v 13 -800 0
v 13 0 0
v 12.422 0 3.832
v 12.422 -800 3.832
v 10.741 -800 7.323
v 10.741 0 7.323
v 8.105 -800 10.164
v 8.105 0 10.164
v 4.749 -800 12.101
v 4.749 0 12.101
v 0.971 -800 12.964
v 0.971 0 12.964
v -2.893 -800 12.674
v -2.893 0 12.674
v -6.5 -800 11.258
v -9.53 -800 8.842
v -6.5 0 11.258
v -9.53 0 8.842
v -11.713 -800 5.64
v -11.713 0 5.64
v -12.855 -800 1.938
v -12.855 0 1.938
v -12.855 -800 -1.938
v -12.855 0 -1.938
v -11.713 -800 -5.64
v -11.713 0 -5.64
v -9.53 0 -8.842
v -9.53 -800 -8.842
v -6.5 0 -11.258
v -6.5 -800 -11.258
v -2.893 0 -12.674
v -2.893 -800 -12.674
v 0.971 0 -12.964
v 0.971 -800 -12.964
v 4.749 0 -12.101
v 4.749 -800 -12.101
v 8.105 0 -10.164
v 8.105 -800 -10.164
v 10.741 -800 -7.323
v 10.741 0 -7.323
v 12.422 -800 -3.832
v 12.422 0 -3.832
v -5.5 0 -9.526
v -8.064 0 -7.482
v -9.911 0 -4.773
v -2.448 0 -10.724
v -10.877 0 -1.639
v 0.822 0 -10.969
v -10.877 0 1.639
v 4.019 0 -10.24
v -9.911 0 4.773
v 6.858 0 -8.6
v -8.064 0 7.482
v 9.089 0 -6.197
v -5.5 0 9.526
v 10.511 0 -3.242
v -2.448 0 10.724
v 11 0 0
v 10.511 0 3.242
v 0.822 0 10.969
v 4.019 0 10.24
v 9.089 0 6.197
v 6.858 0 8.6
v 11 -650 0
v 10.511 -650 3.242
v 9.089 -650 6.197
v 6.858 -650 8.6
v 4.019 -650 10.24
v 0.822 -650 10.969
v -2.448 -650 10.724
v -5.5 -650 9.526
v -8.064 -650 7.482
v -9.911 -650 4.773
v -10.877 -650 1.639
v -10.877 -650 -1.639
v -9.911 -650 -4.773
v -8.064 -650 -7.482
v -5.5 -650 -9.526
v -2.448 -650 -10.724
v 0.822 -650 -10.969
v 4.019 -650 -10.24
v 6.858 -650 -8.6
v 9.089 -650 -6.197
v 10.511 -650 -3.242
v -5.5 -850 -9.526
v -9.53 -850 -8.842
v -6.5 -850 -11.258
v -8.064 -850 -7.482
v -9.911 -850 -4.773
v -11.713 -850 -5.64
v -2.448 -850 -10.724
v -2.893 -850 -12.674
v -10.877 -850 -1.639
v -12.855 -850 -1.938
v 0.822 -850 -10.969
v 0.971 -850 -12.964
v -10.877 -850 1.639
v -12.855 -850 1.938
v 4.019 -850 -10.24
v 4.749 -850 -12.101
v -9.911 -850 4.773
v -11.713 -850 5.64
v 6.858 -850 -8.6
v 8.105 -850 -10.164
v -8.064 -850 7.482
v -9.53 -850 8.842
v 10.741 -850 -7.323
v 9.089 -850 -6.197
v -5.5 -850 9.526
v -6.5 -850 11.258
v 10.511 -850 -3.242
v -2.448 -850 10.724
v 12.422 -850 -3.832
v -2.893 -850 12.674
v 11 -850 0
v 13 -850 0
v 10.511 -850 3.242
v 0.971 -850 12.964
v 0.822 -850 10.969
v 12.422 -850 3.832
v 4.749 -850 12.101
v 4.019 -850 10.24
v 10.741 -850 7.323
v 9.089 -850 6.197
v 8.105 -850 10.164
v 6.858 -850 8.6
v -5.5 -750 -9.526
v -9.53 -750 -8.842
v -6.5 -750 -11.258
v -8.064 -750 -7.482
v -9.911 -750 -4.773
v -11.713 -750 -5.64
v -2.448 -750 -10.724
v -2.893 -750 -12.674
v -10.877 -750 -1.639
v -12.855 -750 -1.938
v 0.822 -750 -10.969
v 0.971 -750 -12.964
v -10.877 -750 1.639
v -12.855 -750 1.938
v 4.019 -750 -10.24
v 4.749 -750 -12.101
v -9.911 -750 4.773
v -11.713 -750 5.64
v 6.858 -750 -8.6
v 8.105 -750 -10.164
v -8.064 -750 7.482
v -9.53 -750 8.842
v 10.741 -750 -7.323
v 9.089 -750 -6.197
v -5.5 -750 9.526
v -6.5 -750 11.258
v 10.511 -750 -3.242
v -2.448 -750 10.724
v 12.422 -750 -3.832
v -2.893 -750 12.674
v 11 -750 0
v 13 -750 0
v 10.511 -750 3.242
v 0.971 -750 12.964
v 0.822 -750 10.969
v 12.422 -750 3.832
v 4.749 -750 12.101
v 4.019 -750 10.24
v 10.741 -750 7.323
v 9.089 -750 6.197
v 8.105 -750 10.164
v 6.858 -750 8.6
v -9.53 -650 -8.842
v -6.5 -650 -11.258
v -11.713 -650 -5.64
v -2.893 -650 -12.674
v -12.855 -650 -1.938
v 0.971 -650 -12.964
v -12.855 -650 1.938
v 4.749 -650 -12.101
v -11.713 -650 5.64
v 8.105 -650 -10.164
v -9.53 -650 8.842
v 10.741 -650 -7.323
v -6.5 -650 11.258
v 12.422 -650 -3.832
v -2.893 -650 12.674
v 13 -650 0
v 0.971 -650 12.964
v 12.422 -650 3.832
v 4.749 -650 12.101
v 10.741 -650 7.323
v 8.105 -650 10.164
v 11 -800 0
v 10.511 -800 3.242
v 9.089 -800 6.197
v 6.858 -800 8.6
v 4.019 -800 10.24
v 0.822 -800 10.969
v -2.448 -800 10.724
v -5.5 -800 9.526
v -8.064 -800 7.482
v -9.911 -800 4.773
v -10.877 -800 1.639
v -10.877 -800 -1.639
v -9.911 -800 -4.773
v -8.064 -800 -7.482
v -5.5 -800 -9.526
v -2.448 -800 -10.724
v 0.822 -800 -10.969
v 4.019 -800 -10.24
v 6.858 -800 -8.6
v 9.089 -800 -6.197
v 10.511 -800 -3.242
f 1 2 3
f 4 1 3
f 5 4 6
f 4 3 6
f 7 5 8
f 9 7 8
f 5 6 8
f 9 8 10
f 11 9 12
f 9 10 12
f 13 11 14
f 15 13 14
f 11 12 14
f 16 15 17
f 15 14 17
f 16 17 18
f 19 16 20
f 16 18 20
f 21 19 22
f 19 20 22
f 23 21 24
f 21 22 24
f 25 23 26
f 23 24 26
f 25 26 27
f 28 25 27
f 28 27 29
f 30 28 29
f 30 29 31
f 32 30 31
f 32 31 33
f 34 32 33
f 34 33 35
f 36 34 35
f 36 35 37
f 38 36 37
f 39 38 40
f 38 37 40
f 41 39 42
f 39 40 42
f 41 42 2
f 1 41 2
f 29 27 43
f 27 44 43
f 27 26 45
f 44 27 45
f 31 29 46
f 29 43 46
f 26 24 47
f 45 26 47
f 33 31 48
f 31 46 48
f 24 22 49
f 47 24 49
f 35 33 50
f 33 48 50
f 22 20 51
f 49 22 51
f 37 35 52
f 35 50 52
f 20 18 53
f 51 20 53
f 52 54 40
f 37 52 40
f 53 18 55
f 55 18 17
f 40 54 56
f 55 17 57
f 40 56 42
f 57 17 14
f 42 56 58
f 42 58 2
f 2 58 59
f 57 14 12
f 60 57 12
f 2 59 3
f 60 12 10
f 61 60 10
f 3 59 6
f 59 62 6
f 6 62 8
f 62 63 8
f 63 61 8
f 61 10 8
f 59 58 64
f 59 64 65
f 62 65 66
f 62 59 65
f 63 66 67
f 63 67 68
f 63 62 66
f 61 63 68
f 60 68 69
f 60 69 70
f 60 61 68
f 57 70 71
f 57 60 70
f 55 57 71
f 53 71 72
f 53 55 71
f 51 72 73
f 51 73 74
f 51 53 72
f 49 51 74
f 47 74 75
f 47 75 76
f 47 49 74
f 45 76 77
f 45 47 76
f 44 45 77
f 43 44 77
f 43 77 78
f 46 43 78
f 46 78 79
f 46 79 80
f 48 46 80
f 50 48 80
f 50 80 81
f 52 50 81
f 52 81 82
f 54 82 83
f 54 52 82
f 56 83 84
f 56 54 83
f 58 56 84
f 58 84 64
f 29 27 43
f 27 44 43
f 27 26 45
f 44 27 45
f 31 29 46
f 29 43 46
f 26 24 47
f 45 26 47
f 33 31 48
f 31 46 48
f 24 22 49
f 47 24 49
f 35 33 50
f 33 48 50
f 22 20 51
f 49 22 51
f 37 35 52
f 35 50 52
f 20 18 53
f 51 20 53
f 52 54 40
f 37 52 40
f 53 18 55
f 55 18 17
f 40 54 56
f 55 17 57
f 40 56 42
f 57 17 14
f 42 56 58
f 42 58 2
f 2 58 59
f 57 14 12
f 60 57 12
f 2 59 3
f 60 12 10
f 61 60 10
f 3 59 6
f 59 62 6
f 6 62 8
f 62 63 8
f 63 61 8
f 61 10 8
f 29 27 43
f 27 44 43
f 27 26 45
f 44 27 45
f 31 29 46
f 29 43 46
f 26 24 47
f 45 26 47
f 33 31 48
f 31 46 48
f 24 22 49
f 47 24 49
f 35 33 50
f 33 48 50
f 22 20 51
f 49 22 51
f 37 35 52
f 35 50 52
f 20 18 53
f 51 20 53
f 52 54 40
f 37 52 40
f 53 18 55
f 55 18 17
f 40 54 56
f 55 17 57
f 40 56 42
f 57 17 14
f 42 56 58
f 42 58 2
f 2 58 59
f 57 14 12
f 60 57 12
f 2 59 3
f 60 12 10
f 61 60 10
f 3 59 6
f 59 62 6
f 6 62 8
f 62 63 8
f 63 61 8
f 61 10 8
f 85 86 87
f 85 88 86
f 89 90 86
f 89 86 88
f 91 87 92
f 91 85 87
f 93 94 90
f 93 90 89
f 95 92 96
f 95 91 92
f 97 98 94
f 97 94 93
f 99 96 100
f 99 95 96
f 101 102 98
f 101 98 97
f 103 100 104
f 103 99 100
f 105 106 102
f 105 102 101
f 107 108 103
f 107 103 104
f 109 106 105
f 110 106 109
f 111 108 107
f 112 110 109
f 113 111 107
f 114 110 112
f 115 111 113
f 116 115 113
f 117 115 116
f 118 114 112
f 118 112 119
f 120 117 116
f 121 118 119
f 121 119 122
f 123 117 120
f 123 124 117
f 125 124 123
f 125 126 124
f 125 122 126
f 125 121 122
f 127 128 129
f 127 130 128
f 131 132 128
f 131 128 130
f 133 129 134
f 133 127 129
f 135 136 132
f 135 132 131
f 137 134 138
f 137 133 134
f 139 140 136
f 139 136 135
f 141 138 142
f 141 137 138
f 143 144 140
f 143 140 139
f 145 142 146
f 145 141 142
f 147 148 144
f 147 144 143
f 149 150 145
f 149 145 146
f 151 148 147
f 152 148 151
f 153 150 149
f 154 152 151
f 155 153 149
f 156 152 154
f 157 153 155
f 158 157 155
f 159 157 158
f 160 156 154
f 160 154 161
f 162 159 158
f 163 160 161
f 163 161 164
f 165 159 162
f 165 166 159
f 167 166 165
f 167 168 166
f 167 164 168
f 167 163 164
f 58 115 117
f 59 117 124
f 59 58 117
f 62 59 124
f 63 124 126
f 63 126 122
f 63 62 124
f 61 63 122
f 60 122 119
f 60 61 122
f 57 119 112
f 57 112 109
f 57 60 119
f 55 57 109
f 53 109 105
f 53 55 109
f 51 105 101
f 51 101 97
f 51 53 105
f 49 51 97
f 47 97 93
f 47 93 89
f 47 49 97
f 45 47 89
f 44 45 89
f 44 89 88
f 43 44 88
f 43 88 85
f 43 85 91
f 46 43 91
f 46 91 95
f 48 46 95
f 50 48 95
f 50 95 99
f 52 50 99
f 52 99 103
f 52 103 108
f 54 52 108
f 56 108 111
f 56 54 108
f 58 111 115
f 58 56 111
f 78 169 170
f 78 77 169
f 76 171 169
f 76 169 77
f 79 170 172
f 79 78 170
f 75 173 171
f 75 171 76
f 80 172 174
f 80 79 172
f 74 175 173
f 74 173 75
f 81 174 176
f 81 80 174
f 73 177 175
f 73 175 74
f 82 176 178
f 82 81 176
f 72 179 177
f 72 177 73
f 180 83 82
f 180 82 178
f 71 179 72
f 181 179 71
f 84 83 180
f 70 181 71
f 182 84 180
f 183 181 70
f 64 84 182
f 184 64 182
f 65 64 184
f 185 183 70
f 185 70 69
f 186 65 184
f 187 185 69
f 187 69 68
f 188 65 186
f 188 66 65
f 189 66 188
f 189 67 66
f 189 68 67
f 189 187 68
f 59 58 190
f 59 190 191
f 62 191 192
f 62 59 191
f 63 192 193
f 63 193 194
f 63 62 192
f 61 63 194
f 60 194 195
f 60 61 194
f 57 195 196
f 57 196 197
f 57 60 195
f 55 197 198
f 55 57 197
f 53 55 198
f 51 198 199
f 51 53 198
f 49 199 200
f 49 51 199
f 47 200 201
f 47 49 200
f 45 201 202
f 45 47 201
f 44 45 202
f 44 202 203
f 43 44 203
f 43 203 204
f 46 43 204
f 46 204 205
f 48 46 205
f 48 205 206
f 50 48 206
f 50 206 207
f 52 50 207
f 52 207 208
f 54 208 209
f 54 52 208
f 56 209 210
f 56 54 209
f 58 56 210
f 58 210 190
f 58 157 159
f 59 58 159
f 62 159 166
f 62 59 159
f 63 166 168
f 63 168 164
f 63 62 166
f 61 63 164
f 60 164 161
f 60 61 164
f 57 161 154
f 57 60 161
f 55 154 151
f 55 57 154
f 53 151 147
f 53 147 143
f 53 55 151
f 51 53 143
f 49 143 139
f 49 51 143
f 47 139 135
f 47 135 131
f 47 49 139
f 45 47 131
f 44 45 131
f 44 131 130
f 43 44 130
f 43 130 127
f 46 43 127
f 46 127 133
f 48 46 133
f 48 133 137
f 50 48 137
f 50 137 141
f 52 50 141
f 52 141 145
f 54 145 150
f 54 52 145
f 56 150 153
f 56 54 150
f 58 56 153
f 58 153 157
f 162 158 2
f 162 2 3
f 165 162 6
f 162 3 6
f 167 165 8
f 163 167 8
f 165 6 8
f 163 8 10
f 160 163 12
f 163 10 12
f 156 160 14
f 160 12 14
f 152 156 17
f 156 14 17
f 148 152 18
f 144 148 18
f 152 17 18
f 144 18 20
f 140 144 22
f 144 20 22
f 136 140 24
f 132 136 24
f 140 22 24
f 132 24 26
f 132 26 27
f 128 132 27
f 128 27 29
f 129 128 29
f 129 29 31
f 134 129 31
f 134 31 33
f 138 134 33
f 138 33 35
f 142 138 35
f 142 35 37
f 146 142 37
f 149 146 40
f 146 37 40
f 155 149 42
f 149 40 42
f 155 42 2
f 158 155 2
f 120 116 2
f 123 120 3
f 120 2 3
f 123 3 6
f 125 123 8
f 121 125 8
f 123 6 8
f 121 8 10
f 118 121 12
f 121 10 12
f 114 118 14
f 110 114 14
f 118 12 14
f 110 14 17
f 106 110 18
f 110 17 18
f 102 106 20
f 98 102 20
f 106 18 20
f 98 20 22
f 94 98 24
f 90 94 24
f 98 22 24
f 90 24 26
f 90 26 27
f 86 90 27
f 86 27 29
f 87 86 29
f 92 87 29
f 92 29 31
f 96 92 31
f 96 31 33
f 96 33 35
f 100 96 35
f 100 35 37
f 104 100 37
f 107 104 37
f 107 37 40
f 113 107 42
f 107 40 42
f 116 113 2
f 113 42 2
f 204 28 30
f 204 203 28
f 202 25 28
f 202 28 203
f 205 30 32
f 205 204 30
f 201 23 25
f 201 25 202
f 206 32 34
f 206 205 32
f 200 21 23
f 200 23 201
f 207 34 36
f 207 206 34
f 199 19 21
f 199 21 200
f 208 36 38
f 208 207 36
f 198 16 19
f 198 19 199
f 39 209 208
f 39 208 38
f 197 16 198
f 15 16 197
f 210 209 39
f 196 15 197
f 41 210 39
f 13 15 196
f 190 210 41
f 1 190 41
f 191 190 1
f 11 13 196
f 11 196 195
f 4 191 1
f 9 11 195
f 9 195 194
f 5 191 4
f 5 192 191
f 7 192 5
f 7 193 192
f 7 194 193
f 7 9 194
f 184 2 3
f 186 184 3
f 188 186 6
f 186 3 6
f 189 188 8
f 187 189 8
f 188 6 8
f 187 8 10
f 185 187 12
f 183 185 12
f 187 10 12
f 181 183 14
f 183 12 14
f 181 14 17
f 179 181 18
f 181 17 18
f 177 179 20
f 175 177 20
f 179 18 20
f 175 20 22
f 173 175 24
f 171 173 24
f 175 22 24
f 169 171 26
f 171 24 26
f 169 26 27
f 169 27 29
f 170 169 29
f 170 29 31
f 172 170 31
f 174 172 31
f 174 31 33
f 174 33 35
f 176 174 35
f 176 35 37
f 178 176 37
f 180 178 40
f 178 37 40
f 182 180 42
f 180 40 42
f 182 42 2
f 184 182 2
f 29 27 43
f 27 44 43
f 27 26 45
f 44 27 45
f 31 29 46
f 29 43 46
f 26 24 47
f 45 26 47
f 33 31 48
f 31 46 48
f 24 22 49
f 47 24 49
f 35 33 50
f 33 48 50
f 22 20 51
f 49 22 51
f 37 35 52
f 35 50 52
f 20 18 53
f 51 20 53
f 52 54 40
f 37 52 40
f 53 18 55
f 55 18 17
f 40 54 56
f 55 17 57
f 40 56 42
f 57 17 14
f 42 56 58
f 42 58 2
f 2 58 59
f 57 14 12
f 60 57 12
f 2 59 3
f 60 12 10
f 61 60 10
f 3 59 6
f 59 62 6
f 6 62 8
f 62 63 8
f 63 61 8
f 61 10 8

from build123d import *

# Parameters (mm, degrees)
F0_R     = 13
F0_R_2   = 11
F1_DEPTH = 800
F2_DEPTH = 750
F3_DEPTH = 850
F4_DEPTH = 650


with BuildPart() as f1:
    # F0 (on Front) → F1 (new body)
    with BuildSketch(Plane.XZ):
        Circle(F0_R)
        Circle(F0_R_2, mode=Mode.SUBTRACT)
    extrude(amount=F1_DEPTH)


with BuildPart() as f2:
    # F0 (on Front) → F2 (new body)
    with BuildSketch(Plane.XZ):
        Circle(F0_R)
        Circle(F0_R_2, mode=Mode.SUBTRACT)
    extrude(amount=F2_DEPTH)


with BuildPart() as f3:
    # F0 (on Front) → F3 (new body)
    with BuildSketch(Plane.XZ):
        Circle(F0_R)
        Circle(F0_R_2, mode=Mode.SUBTRACT)
    extrude(amount=F3_DEPTH)


with BuildPart() as f4:
    # F0 (on Front) → F4 (new body)
    with BuildSketch(Plane.XZ):
        Circle(F0_R)
        Circle(F0_R_2, mode=Mode.SUBTRACT)
    extrude(amount=F4_DEPTH)


solid = Compound([f1.part, f2.part, f3.part, f4.part])
